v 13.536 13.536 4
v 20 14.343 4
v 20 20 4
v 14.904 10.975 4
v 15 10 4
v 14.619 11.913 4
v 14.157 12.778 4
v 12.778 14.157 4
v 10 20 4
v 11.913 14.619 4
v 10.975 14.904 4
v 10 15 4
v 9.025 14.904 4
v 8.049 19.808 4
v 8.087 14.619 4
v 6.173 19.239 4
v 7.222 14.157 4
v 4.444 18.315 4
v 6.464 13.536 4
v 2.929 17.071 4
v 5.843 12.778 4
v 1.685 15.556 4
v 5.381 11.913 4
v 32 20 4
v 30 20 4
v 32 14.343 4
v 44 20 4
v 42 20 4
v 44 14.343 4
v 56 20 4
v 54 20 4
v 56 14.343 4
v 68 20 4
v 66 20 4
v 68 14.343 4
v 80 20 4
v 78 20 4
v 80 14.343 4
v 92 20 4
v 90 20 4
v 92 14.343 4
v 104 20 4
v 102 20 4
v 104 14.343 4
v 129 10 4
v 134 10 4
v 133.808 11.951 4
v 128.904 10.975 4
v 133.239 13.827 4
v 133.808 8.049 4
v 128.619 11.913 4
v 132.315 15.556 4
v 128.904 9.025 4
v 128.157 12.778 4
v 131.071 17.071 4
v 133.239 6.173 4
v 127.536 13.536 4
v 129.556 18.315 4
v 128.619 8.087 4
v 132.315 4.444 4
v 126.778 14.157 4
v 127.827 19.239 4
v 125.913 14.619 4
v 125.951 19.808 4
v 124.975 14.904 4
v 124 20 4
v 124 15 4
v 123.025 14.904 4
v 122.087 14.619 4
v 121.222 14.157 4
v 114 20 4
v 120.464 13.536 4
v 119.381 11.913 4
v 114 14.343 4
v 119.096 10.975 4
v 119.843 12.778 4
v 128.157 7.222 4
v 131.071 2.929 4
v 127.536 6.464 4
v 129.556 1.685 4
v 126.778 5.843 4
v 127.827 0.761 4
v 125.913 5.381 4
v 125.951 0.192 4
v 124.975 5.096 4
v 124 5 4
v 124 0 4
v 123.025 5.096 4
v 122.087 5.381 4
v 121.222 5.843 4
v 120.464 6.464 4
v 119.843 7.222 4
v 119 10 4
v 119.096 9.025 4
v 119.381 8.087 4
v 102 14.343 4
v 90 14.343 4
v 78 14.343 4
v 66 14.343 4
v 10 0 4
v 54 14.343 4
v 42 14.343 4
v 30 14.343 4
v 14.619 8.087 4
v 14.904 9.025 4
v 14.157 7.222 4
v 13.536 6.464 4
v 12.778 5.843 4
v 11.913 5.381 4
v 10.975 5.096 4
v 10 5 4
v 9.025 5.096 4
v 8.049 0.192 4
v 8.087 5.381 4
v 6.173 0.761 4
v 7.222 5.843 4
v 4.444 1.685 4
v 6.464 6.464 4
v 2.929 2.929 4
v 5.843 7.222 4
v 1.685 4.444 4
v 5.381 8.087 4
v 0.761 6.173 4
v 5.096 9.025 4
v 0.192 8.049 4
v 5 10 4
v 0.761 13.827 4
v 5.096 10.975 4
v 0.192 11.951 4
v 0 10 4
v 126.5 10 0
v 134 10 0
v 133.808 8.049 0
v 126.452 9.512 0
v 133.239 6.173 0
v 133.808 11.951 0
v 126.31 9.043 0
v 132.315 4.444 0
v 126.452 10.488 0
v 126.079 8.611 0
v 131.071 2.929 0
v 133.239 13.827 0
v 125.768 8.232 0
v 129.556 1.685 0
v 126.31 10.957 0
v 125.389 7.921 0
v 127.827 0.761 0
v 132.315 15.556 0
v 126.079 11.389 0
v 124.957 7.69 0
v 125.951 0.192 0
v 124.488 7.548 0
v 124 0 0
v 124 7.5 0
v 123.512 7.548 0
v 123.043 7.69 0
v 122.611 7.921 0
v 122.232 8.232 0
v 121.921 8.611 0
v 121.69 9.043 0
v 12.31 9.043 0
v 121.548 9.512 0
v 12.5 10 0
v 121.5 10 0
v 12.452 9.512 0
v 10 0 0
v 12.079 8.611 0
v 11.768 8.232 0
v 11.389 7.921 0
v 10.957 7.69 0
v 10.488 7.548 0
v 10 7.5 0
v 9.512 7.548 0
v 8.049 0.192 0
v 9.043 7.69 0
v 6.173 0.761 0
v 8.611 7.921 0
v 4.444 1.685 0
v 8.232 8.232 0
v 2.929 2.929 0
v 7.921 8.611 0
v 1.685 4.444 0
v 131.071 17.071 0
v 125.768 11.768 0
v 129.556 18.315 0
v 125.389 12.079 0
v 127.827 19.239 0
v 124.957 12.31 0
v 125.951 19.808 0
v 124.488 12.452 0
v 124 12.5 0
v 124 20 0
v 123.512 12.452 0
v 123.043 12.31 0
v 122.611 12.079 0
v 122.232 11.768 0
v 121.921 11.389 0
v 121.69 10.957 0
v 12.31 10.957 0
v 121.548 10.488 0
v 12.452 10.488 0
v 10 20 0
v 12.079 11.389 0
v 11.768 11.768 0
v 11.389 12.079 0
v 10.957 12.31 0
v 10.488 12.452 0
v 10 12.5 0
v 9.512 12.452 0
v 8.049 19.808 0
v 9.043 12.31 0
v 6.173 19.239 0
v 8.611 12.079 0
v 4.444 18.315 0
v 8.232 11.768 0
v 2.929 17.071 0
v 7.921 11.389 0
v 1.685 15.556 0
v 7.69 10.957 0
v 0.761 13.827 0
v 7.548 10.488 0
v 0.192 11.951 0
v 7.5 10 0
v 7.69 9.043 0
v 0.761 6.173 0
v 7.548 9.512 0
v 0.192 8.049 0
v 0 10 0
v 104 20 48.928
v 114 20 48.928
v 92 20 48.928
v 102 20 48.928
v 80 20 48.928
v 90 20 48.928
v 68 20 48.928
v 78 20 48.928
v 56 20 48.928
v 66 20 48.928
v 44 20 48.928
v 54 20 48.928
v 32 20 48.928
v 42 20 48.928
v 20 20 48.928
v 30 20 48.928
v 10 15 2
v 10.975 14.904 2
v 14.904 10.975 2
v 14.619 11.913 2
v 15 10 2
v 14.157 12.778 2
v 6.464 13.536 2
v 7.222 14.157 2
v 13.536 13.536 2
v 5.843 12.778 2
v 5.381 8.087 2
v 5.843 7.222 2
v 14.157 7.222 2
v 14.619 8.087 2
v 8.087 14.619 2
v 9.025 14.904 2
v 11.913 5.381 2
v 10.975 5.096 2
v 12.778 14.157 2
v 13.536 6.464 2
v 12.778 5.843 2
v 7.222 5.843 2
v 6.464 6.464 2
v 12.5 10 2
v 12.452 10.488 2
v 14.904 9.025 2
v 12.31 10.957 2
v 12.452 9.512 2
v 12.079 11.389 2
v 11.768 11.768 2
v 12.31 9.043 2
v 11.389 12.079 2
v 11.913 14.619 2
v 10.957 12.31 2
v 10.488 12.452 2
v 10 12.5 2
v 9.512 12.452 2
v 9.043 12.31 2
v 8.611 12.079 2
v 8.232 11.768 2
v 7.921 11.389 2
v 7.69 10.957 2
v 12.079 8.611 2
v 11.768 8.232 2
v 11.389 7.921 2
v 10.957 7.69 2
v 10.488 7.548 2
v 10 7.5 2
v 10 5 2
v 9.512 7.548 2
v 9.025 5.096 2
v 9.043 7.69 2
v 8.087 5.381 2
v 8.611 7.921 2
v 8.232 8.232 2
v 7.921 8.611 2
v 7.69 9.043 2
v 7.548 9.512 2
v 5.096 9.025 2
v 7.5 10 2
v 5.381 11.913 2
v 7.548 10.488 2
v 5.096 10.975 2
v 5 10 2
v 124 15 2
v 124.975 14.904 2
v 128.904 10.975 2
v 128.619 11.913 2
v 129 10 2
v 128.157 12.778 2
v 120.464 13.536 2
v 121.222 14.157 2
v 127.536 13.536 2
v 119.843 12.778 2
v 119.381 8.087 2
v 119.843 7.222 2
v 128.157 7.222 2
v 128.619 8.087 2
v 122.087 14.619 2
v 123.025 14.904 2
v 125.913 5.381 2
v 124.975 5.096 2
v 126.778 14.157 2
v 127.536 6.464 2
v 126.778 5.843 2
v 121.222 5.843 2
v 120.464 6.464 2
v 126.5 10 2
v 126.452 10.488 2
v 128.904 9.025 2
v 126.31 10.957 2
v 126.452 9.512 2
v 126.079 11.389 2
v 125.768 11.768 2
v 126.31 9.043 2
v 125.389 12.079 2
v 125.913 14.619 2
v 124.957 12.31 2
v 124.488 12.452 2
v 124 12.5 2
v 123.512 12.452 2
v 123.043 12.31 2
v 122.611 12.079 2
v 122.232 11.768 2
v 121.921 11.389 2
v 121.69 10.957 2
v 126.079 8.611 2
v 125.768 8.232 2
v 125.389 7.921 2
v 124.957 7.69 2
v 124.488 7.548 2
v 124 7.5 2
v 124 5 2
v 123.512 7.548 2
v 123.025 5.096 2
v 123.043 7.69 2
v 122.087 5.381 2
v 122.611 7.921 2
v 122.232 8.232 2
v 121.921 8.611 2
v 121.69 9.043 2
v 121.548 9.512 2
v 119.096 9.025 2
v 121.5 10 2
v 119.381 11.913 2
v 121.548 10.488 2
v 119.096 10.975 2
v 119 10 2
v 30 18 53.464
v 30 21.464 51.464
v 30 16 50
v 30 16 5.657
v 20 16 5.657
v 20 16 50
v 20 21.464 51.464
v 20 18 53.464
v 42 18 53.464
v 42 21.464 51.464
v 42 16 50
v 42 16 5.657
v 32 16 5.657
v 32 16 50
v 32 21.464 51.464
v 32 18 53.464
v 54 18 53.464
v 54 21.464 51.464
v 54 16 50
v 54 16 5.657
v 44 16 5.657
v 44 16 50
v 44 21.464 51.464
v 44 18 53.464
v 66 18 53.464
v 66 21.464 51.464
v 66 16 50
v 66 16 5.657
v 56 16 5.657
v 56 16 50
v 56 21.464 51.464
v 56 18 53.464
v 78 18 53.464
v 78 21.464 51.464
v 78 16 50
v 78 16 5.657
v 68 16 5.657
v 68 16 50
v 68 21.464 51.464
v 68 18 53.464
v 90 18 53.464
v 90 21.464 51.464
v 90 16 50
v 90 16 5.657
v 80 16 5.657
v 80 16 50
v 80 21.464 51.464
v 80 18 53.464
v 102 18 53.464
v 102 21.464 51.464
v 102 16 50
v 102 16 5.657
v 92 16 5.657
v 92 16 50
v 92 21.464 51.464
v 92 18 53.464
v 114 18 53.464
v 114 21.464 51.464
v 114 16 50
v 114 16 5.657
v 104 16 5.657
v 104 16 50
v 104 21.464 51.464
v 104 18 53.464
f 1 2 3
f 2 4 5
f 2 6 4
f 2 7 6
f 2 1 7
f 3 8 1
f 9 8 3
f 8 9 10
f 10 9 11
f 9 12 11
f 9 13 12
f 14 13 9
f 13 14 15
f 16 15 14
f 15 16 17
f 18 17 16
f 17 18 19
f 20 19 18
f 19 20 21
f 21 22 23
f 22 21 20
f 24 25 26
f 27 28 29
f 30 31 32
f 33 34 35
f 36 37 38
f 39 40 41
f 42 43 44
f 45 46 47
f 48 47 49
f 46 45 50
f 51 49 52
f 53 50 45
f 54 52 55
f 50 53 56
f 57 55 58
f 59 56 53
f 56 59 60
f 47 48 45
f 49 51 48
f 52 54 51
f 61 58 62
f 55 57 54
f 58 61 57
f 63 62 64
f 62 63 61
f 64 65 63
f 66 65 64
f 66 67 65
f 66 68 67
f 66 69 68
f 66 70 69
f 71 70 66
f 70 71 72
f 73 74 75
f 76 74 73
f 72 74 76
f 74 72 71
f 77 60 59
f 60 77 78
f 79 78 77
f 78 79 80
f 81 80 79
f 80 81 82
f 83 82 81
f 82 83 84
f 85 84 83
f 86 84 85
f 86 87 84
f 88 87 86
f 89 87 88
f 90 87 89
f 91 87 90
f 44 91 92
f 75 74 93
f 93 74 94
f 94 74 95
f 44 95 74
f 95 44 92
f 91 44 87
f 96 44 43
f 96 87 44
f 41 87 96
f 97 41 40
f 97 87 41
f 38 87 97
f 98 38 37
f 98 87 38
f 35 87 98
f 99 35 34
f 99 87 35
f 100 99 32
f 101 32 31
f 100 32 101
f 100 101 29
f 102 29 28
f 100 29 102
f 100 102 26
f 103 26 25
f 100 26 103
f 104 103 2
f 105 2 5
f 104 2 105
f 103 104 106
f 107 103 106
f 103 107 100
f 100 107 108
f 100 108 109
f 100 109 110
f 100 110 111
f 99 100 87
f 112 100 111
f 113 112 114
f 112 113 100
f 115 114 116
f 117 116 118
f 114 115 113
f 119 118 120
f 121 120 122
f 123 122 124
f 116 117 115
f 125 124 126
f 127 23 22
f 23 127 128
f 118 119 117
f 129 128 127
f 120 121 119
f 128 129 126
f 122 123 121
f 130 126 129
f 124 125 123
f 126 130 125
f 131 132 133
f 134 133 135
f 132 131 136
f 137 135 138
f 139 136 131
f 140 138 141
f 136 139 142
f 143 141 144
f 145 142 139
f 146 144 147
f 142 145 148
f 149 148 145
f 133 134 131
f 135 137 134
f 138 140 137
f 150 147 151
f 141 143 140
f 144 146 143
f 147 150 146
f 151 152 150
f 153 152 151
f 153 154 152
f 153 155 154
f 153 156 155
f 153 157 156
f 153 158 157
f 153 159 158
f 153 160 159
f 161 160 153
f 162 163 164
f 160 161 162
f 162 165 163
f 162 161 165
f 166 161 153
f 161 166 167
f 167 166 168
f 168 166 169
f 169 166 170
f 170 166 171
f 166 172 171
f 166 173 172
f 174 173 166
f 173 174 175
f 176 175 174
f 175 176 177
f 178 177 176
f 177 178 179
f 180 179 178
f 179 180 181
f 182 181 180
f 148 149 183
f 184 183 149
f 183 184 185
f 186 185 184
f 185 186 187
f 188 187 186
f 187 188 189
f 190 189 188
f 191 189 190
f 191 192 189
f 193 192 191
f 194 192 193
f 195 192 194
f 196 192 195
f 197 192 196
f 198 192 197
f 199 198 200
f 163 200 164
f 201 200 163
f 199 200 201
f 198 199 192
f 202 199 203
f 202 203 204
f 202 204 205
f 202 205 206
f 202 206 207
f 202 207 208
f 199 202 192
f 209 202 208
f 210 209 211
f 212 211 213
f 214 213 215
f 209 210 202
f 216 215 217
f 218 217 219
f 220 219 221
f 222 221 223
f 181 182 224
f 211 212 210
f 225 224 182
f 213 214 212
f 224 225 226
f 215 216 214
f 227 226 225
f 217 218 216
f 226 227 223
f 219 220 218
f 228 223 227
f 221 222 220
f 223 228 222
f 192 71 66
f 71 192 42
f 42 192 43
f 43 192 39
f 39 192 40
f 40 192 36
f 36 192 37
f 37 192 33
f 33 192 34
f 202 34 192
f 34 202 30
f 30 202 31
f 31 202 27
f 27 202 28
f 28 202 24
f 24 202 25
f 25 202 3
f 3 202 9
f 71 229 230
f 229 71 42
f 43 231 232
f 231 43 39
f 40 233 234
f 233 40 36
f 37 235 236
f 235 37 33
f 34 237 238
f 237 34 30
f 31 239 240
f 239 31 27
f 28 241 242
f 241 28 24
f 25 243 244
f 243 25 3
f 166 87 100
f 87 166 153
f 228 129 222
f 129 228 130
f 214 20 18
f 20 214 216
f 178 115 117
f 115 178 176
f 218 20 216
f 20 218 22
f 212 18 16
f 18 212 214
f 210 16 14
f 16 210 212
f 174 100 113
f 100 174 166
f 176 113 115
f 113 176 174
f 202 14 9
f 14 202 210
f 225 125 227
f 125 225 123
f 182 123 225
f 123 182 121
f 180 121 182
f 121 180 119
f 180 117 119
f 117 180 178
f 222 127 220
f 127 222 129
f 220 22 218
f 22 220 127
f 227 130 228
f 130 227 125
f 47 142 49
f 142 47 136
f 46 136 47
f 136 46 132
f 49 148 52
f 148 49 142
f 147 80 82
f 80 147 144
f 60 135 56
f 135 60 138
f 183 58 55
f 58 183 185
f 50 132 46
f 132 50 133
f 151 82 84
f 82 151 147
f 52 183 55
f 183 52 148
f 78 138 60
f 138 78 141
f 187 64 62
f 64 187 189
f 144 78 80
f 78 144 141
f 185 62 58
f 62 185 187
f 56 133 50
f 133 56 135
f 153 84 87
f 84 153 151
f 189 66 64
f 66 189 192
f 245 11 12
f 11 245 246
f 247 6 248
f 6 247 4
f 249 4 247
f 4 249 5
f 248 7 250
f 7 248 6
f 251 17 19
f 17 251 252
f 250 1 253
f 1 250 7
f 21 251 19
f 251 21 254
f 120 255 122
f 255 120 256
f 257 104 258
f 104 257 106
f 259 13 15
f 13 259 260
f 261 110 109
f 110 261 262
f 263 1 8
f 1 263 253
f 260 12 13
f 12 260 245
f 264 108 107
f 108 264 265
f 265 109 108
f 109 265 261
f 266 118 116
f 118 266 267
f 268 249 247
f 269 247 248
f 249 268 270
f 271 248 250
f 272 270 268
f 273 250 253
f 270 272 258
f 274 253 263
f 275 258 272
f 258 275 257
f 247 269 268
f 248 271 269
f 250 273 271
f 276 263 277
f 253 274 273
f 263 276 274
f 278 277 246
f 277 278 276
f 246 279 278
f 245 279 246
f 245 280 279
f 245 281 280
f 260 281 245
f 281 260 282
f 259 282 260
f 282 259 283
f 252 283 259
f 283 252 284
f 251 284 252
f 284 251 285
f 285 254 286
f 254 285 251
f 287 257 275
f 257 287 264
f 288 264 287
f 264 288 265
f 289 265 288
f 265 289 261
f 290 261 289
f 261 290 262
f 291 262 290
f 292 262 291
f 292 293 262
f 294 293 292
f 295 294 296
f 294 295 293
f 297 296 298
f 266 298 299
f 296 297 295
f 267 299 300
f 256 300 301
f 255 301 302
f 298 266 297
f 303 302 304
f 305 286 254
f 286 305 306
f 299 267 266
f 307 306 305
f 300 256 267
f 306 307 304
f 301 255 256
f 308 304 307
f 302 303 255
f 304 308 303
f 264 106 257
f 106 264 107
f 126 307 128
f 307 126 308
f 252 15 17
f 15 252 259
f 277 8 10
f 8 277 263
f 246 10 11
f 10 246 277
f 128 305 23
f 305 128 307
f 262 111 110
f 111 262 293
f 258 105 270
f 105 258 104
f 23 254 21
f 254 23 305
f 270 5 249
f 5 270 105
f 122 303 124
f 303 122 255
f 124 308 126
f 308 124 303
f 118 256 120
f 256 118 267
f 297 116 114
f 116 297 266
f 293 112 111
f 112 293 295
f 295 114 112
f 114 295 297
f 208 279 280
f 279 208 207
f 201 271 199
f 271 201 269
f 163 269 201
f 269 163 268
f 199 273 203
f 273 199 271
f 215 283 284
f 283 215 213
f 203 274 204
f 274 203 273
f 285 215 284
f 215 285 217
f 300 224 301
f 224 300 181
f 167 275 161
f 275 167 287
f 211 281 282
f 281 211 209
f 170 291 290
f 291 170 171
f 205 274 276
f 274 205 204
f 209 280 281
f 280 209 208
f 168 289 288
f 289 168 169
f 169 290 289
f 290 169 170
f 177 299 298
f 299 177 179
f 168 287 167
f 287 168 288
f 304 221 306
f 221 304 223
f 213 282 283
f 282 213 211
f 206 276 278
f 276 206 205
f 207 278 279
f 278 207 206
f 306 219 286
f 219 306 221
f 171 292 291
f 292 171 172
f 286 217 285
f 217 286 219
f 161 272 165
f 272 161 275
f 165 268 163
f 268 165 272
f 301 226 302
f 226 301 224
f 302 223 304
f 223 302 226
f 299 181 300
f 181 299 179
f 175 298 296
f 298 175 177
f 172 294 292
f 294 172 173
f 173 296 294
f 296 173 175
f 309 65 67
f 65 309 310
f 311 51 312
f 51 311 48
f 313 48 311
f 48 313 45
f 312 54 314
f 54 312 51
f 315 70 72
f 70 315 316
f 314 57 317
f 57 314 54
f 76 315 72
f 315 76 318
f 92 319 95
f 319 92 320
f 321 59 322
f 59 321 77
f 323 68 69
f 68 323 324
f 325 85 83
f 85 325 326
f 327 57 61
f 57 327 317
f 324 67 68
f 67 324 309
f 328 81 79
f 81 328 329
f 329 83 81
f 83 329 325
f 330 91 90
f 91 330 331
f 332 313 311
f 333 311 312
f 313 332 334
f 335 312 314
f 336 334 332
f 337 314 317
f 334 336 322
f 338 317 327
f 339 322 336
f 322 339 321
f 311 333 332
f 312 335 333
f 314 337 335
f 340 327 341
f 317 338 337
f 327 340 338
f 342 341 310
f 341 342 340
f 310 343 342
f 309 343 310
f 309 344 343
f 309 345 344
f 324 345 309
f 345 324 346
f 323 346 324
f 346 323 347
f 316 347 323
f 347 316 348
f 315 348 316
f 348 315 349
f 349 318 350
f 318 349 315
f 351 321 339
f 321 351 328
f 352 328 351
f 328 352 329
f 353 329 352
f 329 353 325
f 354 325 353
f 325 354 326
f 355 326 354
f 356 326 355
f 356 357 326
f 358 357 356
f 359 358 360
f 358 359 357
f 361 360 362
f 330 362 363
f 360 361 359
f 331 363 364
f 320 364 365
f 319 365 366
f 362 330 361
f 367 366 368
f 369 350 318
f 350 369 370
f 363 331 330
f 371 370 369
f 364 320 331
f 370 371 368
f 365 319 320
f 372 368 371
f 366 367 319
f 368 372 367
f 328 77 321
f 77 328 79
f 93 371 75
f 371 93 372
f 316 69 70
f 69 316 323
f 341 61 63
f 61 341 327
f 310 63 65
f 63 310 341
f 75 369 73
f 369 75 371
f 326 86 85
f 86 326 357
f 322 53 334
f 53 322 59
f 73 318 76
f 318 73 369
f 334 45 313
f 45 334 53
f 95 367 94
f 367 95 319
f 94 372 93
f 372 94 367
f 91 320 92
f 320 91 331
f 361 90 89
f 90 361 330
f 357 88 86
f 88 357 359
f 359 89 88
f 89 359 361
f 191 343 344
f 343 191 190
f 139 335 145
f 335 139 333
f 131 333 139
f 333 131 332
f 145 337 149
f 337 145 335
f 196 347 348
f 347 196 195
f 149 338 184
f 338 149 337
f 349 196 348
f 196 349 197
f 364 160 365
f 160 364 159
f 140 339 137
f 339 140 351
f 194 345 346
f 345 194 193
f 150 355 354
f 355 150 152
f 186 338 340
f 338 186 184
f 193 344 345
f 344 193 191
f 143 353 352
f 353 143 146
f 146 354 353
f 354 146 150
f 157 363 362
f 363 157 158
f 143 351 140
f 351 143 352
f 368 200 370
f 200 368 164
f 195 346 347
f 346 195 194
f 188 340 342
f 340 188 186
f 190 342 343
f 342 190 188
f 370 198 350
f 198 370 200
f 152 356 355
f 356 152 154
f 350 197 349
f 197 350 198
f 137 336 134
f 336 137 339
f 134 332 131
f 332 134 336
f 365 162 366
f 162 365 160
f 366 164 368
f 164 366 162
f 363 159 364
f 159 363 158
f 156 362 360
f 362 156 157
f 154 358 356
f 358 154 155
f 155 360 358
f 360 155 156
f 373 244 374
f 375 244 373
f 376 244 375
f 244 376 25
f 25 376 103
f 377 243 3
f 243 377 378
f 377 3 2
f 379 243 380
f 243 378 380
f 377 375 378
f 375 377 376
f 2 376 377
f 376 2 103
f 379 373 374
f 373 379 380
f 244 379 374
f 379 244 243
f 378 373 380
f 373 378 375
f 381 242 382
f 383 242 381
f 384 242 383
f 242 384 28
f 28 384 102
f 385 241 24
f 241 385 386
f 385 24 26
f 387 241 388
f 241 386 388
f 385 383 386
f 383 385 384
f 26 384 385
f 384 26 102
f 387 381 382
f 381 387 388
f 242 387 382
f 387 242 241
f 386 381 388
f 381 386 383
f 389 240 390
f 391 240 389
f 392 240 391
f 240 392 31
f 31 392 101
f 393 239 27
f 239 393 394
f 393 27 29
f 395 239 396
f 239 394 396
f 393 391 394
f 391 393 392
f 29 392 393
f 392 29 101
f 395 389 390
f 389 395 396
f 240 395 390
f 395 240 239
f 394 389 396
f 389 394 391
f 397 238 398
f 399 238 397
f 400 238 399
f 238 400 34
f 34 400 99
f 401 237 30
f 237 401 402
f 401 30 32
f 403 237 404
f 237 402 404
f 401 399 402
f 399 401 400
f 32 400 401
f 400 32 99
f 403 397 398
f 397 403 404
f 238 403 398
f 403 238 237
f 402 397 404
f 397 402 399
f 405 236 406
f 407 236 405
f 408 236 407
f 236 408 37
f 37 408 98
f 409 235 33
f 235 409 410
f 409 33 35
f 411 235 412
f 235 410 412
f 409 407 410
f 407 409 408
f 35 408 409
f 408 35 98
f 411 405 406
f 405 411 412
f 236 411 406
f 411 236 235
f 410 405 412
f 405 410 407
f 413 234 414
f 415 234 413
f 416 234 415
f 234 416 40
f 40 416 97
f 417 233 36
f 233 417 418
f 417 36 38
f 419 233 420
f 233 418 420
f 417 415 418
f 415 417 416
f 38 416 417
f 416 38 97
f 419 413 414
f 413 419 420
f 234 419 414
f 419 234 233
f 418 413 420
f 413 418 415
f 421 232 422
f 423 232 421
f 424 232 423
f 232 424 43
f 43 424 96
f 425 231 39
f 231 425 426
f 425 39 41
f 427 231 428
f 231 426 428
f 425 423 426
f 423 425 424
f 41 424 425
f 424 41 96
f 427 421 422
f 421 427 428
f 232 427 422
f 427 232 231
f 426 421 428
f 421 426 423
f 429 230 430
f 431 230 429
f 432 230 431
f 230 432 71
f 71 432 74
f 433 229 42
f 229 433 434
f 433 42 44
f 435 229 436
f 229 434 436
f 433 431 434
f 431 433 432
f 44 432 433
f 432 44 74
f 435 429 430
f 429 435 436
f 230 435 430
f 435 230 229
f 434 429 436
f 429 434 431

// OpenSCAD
// This script creates a wire rack with a variable number of tines

$fn = 32+1-1;	// Dummy math to avoid showing in customizer.

// Number of tines
N = 8;			// [2:20]
tine_width = 10;
tine_height = 4+1-1;
tine_length = 50;
tine_pitch = 12;

base_height = 20;
base_width = base_height*2 + (N-1)*(tine_pitch) + tine_width;
base_thickness = 4+1-1;

echo("<b>Base width [mm]:", base_width);

countersink_diameter = 10;
hole_diameter = 5;

difference()
{
	// Baseplate
	union()
	{
		translate([base_height/2,0,0]) cube([base_width-base_height,base_height,base_thickness]);
		translate([base_height/2,base_height/2,0]) cylinder(base_thickness,base_height/2,base_height/2);
		translate([base_width-base_height/2,base_height/2,0]) cylinder(base_thickness,base_height/2,base_height/2);		
	}

	// Screw holes
	for (i = [0:1])
	{
		translate([base_height/2+(base_width-base_height)*i,base_height/2,4])
		{
			union()
			{
				// Countersink
				cylinder(base_thickness,countersink_diameter/2,countersink_diameter/2,true);

				// Screw hole
				cylinder(base_thickness*3,hole_diameter/2,hole_diameter/2,true);
			}

		}
	}

	// Text
	/*translate([base_width/2-10.75*2.4,2,base_thickness-1])
		scale([12,12,2])
			import("WireRackText.stl");*/
}

// Tines
for (i = [0:(N-1)])
{
	// Tine
	translate([base_height + tine_pitch*i, base_height - tine_height, 0])
		cube([tine_width,tine_height,tine_length]);

	// Tine support
	translate([base_height + tine_pitch*i, base_height-tine_height, 0])
		rotate([45, 0, 0])
			cube([tine_width, tine_height, tine_height]);

	// Upturned tine end
	translate([base_height+tine_pitch*i,base_height-tine_height,tine_length])
		rotate([-30,0,0])
			cube([tine_width,tine_height,tine_height]);
}




